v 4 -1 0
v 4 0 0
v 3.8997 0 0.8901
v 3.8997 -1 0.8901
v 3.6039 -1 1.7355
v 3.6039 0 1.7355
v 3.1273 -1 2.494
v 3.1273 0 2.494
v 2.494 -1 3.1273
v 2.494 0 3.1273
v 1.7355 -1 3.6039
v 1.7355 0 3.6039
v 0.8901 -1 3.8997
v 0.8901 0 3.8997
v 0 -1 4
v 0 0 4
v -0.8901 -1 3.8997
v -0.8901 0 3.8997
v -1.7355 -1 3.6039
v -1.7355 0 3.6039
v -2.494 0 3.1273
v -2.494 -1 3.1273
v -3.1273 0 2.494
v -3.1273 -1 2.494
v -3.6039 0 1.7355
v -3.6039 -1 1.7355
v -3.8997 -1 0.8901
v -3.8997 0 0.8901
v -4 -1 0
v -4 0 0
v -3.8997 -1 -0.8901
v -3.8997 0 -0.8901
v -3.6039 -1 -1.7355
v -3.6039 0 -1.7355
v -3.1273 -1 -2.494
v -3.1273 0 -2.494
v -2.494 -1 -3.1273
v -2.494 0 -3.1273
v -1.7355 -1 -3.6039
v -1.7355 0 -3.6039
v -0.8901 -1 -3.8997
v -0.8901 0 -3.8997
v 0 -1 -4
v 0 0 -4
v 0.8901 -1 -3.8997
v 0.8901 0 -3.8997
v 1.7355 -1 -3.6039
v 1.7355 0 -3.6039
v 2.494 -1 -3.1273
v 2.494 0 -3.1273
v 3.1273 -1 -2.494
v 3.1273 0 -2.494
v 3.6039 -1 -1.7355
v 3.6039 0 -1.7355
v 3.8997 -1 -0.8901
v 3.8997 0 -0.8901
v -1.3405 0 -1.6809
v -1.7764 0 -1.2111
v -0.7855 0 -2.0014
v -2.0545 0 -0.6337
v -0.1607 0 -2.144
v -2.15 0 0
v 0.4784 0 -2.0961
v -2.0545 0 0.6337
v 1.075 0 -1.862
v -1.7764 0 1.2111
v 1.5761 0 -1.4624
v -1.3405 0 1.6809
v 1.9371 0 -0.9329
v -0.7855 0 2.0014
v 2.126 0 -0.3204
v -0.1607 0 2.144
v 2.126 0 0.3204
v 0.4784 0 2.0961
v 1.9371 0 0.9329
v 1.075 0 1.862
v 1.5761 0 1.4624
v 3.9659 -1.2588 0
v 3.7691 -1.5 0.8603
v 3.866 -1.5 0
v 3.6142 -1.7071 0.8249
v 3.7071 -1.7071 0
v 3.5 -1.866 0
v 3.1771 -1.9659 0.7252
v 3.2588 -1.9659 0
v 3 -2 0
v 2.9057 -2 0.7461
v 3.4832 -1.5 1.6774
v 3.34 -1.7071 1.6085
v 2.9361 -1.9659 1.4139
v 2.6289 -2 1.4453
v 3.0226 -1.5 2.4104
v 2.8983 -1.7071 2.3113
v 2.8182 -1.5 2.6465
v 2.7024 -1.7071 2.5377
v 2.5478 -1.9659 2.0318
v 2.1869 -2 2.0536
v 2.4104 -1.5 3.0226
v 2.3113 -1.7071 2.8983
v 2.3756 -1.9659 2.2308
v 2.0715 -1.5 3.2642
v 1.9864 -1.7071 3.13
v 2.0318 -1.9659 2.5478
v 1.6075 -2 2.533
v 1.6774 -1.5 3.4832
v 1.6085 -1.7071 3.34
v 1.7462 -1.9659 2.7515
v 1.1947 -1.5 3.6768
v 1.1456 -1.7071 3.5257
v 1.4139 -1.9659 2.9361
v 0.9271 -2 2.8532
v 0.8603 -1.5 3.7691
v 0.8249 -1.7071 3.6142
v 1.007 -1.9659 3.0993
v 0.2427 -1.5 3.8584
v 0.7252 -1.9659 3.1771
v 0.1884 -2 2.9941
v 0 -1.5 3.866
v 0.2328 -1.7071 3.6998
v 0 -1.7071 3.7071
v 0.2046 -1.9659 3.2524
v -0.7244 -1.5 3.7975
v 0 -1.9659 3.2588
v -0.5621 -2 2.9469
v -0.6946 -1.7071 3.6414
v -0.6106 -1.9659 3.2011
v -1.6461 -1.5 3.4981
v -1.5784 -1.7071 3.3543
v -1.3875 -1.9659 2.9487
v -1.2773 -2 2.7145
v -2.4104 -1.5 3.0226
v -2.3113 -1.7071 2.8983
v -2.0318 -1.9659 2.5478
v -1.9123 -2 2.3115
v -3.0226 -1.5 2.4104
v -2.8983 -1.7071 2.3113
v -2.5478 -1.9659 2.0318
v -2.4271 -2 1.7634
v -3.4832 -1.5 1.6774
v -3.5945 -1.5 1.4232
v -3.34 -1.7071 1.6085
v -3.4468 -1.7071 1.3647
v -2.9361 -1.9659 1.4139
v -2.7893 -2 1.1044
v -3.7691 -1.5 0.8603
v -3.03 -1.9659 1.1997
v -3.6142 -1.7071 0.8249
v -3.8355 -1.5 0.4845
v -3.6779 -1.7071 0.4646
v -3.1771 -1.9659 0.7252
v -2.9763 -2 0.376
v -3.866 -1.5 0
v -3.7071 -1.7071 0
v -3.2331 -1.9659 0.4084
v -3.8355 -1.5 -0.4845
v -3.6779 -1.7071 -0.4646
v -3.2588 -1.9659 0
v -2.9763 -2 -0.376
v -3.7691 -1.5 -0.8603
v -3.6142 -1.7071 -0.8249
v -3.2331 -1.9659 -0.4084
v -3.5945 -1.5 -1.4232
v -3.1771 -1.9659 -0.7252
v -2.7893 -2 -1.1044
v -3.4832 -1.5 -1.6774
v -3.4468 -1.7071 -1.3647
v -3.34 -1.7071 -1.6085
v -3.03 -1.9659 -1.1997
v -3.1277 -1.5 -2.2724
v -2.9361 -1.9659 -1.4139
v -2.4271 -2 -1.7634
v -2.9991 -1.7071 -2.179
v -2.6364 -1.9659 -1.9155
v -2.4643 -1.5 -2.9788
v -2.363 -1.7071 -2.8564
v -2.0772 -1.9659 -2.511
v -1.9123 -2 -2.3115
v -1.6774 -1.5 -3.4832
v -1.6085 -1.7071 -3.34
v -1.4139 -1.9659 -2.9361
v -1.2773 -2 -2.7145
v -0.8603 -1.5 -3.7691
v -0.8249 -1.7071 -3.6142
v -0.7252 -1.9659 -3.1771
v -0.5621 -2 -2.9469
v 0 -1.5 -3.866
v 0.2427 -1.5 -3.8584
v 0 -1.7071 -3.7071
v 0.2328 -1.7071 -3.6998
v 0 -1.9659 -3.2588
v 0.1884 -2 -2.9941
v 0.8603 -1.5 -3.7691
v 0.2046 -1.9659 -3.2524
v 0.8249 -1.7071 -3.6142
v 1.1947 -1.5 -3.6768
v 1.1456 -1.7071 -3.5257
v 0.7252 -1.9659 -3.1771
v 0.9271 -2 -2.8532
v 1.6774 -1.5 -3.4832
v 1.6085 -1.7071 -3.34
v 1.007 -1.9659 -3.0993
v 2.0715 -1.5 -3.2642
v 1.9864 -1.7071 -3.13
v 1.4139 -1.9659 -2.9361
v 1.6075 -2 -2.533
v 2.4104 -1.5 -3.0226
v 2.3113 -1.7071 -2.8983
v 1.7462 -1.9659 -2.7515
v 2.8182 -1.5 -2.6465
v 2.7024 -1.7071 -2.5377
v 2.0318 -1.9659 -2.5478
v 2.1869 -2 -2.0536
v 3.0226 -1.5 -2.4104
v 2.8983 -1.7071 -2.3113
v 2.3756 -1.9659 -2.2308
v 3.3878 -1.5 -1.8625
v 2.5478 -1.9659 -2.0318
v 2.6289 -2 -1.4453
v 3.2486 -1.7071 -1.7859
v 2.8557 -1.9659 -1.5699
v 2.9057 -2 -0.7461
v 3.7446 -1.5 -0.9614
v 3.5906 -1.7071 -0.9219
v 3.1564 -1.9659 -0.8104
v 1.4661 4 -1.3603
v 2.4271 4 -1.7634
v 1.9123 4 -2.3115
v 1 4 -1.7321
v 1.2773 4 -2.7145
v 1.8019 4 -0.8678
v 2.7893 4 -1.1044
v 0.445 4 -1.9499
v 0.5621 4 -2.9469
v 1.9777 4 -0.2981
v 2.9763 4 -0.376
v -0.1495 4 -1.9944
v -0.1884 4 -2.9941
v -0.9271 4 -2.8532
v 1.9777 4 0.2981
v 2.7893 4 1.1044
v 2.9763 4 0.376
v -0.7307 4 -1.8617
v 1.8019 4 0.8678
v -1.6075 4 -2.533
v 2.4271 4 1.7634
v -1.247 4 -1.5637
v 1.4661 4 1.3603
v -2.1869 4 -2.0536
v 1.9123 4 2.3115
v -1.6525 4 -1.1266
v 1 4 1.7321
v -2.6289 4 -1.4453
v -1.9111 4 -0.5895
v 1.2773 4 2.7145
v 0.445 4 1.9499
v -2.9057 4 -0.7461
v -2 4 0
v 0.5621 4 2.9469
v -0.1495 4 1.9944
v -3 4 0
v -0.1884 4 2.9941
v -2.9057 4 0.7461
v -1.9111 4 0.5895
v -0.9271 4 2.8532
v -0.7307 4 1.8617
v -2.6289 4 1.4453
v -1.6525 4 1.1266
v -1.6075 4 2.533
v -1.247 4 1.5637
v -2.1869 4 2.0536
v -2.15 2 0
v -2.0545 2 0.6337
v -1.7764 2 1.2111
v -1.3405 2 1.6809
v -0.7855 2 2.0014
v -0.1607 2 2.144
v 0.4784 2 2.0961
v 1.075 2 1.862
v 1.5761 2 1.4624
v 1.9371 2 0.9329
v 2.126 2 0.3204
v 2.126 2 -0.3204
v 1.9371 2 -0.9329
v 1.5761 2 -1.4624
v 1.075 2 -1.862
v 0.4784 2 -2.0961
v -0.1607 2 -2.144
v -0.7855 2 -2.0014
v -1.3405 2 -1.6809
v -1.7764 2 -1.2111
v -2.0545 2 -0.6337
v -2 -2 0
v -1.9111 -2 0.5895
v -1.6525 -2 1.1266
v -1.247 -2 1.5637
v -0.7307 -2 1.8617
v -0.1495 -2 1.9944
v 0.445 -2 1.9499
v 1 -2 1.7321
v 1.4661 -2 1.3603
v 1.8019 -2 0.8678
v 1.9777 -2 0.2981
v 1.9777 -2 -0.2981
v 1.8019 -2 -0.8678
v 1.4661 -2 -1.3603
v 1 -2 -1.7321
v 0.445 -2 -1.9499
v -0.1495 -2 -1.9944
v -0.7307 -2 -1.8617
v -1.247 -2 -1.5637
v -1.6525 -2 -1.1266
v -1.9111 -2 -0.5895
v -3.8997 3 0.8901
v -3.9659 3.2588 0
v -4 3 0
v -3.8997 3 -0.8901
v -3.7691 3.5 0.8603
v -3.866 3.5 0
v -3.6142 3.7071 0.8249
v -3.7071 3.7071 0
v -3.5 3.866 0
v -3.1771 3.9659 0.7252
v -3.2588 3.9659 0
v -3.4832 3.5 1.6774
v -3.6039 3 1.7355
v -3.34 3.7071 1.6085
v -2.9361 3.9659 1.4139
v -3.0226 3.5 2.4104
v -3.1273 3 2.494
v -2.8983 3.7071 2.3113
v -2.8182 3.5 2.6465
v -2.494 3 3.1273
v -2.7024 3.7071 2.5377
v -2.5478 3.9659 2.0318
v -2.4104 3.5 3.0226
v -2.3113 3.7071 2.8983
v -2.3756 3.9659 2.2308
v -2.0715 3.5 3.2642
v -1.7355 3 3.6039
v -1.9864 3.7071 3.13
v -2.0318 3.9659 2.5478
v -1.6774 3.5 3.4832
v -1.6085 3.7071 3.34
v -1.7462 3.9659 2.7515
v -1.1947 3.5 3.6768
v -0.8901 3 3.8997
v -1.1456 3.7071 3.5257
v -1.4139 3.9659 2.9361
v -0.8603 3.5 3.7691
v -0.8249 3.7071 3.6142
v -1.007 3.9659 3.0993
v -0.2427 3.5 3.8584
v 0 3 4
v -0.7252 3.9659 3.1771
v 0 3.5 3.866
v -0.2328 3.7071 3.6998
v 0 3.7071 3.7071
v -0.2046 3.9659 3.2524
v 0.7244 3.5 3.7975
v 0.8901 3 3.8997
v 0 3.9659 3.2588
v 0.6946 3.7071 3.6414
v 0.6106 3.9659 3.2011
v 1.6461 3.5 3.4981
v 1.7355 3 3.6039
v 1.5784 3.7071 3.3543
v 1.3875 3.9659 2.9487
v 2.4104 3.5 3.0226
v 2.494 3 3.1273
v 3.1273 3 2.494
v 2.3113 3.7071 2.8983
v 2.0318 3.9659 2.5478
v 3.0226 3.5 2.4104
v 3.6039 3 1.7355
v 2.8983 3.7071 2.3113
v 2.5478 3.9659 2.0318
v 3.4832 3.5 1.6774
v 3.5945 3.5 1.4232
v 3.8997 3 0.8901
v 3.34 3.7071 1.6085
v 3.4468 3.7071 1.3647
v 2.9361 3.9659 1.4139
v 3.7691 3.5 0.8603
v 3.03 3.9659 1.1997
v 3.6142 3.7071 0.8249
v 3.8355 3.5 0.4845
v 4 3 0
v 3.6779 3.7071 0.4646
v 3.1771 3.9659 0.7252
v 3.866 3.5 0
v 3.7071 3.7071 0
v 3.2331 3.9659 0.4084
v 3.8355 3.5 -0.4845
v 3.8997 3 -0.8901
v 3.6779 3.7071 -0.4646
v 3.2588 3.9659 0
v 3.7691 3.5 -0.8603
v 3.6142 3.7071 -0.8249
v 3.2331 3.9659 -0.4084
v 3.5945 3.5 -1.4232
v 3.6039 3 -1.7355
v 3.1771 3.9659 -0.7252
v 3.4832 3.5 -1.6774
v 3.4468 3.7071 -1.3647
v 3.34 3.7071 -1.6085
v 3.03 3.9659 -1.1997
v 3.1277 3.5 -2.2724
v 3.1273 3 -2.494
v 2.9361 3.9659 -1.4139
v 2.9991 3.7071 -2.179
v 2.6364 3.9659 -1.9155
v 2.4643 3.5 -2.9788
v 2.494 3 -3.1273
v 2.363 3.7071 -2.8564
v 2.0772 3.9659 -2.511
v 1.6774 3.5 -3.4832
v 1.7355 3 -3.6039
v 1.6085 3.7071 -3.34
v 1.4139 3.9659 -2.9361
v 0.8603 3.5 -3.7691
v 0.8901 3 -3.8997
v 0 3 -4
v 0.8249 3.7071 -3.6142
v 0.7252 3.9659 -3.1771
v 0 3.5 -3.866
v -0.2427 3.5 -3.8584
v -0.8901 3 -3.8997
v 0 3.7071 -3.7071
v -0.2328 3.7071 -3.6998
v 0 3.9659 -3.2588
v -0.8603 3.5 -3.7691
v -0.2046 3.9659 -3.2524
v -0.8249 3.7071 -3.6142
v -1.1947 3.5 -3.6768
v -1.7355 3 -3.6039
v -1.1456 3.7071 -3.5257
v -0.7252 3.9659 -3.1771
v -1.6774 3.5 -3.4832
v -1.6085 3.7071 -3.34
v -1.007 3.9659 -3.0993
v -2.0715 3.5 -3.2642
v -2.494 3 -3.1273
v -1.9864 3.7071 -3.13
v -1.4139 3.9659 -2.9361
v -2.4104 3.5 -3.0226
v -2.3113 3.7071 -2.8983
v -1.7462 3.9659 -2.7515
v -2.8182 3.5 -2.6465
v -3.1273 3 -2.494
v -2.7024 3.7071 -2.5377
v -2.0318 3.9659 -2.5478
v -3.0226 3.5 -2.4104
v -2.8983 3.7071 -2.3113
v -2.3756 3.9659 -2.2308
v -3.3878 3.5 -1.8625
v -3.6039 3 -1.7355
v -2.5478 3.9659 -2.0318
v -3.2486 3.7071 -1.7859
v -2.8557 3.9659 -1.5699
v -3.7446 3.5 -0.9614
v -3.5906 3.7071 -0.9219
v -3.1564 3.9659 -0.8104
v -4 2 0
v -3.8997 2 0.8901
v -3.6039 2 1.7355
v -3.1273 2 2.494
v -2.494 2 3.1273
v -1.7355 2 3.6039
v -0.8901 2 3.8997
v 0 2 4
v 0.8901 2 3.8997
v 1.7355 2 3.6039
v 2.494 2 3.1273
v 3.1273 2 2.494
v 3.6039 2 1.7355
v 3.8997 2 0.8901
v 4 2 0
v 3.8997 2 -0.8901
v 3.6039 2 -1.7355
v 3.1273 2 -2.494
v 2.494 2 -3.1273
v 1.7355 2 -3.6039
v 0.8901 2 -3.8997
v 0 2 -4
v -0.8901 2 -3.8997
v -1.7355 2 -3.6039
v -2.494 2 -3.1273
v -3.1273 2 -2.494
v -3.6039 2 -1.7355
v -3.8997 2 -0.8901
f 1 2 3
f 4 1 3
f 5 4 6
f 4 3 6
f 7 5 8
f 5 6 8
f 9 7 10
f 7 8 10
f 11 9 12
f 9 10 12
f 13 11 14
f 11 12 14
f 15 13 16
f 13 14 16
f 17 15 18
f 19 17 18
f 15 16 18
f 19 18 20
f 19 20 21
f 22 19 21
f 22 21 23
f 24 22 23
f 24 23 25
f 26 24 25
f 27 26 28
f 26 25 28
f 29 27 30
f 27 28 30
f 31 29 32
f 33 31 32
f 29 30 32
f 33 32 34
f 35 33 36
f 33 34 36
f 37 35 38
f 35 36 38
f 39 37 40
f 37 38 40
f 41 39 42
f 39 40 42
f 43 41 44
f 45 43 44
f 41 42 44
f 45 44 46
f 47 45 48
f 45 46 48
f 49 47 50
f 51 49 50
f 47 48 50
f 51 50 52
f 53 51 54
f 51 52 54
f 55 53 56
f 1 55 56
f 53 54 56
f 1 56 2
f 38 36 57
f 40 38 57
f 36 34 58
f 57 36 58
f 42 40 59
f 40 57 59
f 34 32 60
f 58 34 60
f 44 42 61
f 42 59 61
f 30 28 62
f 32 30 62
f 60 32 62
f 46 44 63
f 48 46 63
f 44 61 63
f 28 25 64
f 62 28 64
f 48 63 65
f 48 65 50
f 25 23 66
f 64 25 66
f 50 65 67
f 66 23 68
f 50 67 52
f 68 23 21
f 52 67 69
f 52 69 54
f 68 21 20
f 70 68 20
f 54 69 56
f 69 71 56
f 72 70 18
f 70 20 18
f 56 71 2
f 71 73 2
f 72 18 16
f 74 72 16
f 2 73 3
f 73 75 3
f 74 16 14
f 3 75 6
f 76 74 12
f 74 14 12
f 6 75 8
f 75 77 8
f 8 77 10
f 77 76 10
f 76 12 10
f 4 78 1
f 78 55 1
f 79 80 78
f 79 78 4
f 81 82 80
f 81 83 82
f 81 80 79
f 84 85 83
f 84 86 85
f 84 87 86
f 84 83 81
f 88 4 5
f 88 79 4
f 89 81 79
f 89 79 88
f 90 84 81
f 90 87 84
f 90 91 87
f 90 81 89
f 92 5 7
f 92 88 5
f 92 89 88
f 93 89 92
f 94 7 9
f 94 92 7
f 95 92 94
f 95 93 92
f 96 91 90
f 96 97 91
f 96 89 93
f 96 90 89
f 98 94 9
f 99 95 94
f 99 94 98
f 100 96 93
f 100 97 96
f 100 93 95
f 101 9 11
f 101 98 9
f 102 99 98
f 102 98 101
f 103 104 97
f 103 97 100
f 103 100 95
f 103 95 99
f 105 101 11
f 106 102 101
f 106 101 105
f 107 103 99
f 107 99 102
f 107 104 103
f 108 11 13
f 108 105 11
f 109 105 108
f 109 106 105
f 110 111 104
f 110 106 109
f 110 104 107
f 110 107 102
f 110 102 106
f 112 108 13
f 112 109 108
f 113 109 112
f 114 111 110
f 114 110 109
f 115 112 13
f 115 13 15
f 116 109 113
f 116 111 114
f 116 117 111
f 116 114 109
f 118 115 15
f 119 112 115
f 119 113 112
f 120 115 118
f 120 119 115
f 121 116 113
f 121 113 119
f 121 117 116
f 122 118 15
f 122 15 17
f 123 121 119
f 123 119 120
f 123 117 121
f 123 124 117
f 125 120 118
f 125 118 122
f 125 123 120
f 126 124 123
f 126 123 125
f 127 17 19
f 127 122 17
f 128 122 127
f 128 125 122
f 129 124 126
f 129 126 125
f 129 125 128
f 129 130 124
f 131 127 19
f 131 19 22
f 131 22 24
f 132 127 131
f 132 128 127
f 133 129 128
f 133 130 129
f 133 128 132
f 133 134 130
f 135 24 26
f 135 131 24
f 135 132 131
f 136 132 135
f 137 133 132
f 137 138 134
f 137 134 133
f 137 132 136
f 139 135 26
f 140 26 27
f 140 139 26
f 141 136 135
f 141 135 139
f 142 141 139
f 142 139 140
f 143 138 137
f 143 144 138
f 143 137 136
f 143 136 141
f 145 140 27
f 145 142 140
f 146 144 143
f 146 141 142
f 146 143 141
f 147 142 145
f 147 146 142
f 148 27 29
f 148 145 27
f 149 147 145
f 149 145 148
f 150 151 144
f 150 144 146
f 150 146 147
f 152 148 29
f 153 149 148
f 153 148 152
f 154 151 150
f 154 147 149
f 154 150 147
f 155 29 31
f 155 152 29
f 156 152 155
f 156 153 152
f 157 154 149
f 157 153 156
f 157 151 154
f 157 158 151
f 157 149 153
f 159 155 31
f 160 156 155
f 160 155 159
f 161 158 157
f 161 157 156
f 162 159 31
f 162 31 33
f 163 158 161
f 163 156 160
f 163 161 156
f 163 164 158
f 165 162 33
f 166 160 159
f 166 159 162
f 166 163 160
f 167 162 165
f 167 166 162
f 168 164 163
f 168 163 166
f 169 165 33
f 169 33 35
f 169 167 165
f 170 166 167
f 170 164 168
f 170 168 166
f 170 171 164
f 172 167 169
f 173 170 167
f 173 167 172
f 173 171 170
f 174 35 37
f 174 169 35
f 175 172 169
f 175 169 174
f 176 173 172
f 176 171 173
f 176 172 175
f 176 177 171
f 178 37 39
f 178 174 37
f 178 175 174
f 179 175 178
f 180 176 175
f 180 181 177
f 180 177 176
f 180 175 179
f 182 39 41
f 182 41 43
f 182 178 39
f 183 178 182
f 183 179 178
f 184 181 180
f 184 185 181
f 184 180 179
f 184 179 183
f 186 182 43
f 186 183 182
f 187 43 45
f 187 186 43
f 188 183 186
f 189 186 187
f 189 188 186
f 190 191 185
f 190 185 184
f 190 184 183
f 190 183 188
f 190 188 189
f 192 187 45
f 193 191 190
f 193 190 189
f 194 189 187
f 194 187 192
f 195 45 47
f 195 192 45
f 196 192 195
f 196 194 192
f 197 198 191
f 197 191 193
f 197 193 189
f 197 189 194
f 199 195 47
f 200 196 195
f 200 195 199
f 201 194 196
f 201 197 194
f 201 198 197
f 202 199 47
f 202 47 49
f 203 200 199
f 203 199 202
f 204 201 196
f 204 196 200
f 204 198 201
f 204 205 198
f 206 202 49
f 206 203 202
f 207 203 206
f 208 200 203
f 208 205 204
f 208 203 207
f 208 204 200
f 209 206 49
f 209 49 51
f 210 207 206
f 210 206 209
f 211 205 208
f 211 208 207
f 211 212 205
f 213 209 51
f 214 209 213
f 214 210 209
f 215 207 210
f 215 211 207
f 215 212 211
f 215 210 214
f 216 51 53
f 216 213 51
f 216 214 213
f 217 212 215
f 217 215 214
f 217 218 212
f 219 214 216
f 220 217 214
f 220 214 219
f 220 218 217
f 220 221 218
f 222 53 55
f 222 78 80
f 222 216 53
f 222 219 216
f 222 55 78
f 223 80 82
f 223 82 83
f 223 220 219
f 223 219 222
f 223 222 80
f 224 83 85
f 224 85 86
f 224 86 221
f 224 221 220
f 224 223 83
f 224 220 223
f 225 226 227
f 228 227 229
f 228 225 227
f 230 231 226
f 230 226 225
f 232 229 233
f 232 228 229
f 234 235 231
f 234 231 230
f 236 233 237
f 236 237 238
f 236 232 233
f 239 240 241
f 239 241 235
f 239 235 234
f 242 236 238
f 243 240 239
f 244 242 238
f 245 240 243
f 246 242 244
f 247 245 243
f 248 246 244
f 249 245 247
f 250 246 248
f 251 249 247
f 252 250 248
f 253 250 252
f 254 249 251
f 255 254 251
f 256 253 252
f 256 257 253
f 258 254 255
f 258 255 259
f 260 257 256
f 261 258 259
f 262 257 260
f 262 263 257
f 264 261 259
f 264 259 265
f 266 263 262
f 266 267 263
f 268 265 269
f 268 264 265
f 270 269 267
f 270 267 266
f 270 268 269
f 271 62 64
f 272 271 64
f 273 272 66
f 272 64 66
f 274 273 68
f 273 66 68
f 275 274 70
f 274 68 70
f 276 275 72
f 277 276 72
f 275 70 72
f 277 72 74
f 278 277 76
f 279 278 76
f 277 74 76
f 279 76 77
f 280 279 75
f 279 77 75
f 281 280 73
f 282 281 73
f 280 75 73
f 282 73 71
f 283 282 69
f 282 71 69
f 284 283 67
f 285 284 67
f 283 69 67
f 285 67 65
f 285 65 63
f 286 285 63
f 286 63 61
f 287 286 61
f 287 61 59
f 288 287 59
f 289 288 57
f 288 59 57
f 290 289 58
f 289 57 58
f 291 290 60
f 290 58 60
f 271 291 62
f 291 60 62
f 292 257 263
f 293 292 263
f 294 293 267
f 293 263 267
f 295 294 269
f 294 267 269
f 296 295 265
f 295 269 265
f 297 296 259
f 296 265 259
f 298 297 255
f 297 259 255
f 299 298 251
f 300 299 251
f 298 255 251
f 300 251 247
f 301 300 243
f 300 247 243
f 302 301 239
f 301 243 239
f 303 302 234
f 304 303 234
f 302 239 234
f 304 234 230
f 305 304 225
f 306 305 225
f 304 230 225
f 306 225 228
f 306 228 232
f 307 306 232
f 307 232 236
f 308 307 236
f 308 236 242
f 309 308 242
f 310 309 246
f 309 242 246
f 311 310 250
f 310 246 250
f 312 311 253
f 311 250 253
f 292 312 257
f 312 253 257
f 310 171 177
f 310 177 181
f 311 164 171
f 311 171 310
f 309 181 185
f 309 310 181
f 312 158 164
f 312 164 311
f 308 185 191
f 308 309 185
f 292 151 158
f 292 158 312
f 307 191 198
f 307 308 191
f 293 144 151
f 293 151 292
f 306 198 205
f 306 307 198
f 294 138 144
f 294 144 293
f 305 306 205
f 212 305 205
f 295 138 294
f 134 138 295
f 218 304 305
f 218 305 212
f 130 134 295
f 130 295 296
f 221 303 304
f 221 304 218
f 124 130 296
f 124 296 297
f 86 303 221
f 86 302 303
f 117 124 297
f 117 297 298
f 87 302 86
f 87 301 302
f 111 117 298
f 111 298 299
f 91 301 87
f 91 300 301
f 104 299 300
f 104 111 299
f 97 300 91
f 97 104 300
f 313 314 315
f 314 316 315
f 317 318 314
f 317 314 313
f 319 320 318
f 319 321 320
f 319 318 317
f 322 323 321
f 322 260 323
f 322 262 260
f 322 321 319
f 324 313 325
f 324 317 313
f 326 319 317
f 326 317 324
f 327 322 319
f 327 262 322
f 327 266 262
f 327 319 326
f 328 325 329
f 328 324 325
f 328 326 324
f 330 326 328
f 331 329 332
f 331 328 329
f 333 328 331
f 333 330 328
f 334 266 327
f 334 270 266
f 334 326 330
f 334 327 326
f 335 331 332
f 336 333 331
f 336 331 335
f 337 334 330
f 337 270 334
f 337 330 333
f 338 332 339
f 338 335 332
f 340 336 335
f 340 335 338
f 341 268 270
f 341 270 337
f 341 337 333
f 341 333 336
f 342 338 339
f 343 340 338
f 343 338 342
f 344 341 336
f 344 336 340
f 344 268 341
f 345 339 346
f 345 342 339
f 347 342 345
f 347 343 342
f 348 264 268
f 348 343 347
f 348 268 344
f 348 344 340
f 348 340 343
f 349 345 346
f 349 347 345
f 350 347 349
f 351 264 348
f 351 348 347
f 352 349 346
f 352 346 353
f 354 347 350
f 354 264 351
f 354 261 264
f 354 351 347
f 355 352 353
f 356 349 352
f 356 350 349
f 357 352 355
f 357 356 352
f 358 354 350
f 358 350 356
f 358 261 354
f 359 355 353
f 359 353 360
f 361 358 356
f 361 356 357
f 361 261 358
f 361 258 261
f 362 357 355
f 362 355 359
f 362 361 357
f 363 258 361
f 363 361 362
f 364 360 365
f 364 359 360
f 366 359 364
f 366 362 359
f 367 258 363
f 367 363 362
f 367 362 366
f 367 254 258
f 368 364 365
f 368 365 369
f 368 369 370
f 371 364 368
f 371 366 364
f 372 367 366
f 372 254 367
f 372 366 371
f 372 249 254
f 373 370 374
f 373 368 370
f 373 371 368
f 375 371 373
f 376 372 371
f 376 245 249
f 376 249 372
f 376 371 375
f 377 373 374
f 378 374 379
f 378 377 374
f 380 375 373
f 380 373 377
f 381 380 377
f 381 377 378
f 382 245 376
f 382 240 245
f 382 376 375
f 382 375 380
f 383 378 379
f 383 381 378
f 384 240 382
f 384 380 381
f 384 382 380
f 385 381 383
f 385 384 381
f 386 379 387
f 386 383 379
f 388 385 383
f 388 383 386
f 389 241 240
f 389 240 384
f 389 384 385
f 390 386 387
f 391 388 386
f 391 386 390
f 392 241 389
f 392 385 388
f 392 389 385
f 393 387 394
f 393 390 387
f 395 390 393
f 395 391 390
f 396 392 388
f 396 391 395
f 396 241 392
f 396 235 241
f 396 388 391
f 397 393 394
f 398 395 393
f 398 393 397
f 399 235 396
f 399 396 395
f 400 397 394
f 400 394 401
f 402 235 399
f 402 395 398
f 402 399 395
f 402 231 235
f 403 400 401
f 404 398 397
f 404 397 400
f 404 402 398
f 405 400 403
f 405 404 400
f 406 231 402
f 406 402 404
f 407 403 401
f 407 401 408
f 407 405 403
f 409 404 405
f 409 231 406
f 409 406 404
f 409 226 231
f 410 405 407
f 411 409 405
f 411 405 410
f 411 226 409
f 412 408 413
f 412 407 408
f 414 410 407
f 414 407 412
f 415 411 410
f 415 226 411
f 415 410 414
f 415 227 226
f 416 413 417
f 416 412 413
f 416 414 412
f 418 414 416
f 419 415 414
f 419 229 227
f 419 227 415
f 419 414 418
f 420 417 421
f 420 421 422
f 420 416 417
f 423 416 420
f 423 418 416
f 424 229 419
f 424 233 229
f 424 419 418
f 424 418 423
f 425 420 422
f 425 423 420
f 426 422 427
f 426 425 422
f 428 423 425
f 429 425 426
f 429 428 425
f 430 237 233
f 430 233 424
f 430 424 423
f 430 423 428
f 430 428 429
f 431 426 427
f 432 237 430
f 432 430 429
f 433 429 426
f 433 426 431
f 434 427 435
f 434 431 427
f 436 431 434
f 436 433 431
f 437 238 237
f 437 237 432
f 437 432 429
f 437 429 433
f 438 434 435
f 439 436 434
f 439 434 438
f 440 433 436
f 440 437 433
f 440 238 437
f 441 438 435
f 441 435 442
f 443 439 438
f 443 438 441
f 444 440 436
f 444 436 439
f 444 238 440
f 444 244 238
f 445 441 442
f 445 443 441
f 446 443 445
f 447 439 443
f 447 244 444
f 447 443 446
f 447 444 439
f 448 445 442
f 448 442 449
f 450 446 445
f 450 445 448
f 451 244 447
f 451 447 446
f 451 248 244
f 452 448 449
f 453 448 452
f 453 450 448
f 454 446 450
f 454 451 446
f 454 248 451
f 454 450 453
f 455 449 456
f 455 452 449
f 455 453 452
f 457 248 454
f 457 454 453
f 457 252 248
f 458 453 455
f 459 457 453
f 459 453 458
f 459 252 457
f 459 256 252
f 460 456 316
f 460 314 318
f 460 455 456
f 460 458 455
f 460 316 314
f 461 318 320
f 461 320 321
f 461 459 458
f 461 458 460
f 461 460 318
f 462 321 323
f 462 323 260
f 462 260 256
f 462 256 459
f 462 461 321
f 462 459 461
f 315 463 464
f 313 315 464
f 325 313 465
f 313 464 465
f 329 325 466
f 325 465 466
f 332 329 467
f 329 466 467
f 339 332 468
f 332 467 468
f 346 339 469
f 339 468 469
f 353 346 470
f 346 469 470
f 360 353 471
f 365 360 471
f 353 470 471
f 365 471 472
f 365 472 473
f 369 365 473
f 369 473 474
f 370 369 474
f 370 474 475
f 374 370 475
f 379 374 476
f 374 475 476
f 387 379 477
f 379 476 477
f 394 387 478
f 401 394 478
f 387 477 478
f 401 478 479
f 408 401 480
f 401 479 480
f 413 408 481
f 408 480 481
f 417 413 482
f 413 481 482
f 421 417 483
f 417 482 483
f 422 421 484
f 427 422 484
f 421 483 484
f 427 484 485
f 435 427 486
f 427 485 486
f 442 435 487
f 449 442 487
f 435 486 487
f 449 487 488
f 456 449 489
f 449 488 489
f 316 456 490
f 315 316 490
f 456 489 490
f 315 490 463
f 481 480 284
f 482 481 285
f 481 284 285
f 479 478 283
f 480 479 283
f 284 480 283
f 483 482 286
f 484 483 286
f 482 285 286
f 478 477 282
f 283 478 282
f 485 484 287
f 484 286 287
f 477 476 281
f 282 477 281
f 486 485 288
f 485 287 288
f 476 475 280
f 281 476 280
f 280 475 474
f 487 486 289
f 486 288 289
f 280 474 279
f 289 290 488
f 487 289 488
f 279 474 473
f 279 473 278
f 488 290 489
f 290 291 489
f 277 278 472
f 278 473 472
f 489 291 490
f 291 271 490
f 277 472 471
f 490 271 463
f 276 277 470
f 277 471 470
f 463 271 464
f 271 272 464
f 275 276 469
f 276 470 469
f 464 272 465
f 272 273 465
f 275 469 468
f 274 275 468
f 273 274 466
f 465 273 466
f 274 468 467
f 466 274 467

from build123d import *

# Parameters (mm, degrees)
F0_R     = 4
F1_DEPTH = 2
F2_R     = 1
F3_R     = 2.15
F4_DEPTH = 2
F5_R     = 4
F6_DEPTH = 2
F7_R     = 1
F8_R     = 2
F9_DEPTH = 6


with BuildPart() as f1:
    # F0 (on Front) → F1 (new body)
    with BuildSketch(Plane.XZ):
        Circle(F0_R)
    extrude(amount=F1_DEPTH)

    # F2
    f2_edges = [f1.edges().sort_by_distance(p)[0] for p in [
        (-4, -2, 0),
    ]]
    fillet(f2_edges, radius=F2_R)

    # F3 (on face) → F4 (join)
    with BuildSketch(Plane(origin=(0, 0, 0), x_dir=(-1, 0, 0), z_dir=(0, 1, 0))):
        Circle(F3_R)
    extrude(amount=F4_DEPTH)

    # F5 (on face) → F6 (join)
    with BuildSketch(Plane(origin=(0, 2, 0), x_dir=(-1, 0, 0), z_dir=(0, 1, 0))):
        Circle(F5_R)
    extrude(amount=F6_DEPTH)

    # F7
    f7_edges = [f1.edges().sort_by_distance(p)[0] for p in [
        (4, 4, 0),
    ]]
    fillet(f7_edges, radius=F7_R)

    # F8 (on face) → F9 (cut)
    with BuildSketch(Plane(origin=(0, 4, 0), x_dir=(-1, 0, 0), z_dir=(0, 1, 0))):
        Circle(F8_R)
    extrude(amount=-F9_DEPTH, mode=Mode.SUBTRACT)


solid = f1.part
